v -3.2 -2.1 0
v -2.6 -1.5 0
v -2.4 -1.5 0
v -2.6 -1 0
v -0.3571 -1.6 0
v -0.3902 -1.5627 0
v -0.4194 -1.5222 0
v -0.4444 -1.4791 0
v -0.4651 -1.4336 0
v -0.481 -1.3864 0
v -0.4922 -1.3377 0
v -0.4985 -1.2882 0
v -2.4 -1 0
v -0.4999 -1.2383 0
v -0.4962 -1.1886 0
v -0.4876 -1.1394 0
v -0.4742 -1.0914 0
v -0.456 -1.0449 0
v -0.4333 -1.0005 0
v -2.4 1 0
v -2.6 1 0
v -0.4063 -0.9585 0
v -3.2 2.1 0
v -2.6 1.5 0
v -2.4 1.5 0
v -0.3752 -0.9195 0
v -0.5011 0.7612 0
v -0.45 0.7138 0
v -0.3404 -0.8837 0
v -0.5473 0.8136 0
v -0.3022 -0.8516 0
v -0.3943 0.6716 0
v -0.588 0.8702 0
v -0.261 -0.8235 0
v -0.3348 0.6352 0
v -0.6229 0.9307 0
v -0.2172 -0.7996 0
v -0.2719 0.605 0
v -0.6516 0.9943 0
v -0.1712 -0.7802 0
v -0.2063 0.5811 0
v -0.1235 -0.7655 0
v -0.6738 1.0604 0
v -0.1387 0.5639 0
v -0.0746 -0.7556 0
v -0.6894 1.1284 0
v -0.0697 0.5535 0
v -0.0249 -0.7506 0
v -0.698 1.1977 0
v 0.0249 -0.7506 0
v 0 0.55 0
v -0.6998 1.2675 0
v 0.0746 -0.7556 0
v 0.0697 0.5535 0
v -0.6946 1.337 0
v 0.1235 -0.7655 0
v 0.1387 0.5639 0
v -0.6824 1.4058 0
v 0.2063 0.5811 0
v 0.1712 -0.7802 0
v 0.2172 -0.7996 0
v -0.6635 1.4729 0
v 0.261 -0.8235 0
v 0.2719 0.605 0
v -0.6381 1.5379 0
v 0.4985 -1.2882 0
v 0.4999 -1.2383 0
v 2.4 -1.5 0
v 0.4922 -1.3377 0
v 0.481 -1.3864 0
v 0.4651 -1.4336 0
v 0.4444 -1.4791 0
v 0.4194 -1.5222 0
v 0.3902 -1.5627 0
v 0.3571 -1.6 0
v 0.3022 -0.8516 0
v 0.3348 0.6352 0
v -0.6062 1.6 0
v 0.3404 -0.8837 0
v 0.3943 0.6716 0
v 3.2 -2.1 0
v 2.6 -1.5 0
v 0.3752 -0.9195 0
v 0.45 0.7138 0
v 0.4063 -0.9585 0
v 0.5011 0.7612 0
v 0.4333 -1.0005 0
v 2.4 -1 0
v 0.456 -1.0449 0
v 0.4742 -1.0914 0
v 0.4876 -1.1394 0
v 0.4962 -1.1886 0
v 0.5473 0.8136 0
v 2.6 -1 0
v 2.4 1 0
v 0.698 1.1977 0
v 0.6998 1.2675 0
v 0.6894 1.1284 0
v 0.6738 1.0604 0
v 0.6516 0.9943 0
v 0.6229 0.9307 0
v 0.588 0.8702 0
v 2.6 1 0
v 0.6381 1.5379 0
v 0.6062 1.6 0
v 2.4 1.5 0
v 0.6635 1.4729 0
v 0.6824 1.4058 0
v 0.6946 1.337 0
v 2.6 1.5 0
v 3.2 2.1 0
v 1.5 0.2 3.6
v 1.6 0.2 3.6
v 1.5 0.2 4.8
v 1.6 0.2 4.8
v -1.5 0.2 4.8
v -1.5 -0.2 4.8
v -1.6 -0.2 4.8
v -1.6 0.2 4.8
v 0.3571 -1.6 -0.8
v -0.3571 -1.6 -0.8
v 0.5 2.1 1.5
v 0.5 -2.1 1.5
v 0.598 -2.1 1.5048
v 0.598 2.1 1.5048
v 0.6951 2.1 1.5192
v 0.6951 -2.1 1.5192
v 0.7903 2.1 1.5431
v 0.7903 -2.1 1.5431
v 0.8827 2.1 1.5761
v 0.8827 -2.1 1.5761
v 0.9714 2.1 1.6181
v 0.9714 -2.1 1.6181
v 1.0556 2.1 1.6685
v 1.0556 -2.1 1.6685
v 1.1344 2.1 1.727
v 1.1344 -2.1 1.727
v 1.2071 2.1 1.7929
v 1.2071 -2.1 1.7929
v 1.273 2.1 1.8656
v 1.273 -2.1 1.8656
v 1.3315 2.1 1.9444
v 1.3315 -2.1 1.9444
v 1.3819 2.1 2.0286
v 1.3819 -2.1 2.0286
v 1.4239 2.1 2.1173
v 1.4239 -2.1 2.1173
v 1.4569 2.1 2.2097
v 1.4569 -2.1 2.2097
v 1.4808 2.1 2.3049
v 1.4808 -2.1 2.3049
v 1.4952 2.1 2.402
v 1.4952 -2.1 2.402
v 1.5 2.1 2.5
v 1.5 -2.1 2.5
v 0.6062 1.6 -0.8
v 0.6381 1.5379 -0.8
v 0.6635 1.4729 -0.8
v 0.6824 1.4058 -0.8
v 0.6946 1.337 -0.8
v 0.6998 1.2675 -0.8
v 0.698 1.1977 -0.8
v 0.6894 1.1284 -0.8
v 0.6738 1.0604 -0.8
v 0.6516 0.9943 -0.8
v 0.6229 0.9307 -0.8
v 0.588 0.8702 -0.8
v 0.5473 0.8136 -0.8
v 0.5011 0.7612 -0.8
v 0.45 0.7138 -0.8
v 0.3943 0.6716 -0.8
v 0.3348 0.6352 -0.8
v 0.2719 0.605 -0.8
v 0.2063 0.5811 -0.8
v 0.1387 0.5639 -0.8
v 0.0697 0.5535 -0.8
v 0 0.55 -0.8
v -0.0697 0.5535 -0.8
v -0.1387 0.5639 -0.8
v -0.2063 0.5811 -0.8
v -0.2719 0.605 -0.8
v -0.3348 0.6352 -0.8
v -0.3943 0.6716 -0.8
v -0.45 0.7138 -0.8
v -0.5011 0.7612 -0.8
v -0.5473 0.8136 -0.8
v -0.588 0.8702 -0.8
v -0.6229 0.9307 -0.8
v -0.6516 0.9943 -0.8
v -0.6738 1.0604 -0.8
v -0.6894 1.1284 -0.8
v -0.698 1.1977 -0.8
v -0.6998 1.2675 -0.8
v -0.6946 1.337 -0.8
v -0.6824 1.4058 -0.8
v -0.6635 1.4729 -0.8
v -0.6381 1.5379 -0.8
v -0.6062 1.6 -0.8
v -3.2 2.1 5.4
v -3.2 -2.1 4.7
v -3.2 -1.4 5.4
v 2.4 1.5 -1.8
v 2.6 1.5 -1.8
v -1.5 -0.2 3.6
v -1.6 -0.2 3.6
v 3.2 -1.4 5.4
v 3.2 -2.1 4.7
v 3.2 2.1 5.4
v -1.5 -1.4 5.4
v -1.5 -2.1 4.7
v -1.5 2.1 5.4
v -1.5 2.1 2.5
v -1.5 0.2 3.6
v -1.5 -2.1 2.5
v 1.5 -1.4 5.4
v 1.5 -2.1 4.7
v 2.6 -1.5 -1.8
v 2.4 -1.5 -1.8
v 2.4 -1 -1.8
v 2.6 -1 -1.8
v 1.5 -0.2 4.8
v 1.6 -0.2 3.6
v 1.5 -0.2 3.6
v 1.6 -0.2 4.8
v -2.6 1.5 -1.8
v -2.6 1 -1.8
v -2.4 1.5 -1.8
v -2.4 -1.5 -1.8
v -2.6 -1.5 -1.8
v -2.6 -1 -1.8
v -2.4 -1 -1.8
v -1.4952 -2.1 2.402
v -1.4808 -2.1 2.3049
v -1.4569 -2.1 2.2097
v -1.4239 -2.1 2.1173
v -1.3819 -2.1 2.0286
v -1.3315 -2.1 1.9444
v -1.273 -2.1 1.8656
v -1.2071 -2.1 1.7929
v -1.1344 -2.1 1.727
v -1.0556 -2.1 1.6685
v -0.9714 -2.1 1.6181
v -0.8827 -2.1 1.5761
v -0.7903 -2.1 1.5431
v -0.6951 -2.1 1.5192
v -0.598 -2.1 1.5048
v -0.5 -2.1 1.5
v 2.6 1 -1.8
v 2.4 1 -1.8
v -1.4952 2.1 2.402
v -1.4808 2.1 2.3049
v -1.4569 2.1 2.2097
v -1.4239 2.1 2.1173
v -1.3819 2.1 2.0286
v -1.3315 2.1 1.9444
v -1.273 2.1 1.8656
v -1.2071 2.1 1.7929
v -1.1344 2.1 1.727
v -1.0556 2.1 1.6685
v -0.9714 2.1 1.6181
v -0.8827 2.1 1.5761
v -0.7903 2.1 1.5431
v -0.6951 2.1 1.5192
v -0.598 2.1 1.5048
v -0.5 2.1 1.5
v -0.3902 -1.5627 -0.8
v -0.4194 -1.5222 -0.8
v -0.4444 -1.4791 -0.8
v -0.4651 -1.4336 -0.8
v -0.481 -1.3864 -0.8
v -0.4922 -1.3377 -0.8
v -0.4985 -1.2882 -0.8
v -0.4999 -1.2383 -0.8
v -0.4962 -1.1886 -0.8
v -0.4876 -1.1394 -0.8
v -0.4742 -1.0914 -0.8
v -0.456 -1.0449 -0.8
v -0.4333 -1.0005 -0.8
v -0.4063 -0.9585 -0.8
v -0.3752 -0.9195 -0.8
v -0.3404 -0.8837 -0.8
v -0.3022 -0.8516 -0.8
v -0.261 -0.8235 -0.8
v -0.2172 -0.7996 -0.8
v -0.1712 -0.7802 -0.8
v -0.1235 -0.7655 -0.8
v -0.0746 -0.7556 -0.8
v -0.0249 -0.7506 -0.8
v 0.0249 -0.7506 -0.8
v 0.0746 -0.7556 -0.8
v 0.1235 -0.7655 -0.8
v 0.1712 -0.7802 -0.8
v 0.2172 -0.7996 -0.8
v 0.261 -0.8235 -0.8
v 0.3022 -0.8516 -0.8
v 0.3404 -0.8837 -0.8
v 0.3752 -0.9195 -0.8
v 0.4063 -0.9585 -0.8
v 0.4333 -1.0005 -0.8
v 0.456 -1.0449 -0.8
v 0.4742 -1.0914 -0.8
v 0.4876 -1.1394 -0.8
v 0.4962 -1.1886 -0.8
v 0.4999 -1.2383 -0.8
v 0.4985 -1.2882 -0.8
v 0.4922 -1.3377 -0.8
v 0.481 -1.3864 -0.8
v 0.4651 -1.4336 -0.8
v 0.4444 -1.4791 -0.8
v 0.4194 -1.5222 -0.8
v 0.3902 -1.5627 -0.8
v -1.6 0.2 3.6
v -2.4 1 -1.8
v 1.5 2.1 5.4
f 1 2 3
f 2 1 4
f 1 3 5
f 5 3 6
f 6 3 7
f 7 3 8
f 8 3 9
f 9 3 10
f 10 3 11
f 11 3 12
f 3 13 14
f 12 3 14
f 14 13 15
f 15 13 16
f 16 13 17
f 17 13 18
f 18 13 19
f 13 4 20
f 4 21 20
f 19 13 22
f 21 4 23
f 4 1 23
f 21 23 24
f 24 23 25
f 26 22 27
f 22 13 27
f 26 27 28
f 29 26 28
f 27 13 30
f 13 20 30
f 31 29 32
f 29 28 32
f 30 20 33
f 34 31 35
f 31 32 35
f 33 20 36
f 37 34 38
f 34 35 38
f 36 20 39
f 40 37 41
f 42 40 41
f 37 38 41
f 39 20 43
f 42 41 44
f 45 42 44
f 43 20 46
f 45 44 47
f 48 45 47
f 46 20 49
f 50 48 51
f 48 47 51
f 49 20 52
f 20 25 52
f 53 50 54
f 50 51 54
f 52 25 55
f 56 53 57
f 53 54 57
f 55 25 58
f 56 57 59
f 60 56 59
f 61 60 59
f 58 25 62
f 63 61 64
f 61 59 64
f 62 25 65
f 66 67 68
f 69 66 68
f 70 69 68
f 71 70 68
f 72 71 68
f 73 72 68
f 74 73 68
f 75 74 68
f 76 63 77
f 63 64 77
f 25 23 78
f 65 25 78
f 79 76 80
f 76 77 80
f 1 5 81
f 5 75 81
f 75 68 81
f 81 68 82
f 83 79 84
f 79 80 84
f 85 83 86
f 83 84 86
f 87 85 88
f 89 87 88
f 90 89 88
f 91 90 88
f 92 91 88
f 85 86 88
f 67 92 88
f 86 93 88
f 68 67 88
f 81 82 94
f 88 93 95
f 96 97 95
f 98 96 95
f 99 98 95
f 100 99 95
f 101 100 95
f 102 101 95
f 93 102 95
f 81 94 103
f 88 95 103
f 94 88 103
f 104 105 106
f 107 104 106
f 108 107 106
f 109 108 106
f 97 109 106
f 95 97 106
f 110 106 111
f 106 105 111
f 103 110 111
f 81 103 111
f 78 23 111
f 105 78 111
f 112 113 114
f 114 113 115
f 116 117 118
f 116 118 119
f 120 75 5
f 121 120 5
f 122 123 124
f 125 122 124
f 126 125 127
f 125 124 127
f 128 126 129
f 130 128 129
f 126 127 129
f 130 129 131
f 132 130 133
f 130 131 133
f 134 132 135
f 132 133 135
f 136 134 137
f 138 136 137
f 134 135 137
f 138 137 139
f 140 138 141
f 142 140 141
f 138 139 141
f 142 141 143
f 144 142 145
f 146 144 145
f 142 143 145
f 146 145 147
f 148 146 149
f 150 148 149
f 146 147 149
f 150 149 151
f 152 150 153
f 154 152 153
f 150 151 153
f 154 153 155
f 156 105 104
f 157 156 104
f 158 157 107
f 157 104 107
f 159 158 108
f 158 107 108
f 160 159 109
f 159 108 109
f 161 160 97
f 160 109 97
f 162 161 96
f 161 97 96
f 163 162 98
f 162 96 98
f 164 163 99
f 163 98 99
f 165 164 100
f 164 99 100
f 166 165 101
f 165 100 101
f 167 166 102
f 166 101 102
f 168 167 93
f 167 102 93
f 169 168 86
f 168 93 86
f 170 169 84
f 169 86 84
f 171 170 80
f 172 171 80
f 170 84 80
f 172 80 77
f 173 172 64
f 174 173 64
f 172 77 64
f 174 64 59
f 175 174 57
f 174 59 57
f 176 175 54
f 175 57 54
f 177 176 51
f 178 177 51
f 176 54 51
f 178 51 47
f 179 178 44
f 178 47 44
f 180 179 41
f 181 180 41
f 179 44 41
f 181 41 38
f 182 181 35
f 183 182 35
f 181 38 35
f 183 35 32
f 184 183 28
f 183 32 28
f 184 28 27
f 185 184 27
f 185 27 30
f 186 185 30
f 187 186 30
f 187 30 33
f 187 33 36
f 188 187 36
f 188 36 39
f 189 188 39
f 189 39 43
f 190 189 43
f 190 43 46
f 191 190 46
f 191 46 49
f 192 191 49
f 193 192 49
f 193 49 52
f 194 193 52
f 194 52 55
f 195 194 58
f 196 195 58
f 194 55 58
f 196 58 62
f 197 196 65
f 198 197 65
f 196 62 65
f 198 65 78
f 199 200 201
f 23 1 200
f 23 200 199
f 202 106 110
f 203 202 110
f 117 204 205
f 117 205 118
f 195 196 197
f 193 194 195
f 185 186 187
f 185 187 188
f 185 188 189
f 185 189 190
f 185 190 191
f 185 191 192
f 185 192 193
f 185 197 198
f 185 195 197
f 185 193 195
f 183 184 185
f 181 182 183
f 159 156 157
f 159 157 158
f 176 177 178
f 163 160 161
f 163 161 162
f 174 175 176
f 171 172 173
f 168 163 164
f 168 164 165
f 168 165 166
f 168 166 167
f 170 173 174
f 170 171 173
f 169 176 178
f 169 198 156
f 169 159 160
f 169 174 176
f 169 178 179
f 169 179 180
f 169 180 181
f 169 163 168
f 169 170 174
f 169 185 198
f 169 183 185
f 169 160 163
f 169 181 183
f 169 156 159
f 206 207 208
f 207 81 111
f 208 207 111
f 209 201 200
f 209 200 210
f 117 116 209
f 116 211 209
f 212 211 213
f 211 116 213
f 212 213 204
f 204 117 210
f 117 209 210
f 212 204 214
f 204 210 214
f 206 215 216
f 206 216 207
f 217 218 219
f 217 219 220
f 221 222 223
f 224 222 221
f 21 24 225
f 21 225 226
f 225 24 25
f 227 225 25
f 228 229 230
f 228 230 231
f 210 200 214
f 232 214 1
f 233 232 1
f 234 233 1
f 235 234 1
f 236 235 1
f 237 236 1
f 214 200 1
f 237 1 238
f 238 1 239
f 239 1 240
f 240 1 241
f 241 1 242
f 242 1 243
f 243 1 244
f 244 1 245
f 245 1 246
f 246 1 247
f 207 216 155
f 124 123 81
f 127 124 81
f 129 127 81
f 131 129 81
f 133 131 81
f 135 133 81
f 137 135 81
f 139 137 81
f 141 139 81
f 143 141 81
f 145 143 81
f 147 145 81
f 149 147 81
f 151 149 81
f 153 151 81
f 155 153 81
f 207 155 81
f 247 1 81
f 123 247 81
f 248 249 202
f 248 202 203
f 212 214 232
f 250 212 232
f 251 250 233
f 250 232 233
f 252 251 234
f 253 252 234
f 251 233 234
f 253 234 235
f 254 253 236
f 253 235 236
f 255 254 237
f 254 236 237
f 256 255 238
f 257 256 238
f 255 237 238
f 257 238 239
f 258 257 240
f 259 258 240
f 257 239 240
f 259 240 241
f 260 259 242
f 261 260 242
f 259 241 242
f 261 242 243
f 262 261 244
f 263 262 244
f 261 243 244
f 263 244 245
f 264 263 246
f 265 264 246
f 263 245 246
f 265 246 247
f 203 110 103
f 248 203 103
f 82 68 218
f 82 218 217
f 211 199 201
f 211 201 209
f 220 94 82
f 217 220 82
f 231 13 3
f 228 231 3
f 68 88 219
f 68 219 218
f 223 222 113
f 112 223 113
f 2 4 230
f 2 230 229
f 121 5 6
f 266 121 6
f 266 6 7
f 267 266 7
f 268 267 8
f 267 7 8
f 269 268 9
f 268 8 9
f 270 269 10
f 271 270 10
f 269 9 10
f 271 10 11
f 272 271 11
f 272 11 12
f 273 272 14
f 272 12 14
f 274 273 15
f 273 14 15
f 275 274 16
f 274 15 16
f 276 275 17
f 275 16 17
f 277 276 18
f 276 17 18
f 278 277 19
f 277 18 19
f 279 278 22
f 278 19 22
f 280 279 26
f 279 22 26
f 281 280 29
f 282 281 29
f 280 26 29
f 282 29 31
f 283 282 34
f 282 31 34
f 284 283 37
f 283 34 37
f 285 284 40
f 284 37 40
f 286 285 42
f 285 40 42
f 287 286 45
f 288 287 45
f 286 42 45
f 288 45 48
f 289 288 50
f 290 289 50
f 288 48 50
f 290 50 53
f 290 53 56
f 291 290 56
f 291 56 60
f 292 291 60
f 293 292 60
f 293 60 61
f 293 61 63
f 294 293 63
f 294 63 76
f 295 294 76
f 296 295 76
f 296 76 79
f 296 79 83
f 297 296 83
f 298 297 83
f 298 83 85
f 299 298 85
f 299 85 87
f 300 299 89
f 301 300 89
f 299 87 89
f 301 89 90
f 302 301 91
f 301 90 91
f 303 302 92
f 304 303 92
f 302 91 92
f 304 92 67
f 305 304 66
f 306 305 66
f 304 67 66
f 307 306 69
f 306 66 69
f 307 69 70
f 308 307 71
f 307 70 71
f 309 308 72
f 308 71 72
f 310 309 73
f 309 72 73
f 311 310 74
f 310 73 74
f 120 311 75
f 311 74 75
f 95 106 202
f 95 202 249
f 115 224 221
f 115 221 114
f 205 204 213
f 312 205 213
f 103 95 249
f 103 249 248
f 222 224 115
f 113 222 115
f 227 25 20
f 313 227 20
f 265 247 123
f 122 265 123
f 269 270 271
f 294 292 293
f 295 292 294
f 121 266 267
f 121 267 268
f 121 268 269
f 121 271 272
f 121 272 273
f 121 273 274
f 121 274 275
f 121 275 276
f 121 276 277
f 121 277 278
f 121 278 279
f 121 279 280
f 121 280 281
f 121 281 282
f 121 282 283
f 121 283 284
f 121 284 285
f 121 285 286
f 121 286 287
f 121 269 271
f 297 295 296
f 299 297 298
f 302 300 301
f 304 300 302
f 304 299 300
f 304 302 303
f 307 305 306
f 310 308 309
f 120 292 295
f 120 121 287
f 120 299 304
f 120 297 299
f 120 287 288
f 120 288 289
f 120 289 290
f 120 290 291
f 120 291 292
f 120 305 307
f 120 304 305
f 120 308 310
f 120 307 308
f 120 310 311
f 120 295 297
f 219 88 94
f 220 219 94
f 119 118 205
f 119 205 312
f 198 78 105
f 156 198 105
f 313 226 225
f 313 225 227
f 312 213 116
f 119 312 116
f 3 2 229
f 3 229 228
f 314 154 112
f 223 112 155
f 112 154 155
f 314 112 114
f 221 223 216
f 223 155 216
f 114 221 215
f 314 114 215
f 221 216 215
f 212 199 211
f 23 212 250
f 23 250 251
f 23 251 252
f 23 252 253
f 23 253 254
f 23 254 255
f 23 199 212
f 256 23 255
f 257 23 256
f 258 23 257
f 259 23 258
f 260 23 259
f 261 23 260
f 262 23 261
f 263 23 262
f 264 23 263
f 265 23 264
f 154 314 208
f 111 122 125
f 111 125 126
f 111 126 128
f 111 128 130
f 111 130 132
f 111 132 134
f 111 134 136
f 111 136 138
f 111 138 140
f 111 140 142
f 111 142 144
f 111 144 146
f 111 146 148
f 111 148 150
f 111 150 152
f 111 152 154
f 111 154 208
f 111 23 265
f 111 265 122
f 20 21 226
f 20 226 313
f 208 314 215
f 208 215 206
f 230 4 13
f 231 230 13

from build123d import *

# Parameters (mm, degrees)
F0_W      = 6.4
F0_H      = 4.2
F1_DEPTH  = 5.4
F3_DEPTH  = 4.2
F4_SIZE   = 0.7
F5_W      = 0.4
F5_H      = 1.2
F6_DEPTH  = 1.6
F8_DEPTH  = 0.8
F9_W      = 0.2
F9_H      = 0.5
F10_DEPTH = 1.8


with BuildPart() as f1:
    # F0 (on Top) → F1 (new body)
    with BuildSketch(Plane.XY):
        Rectangle(F0_W, F0_H)
    extrude(amount=F1_DEPTH)

    # F2 (on face) → F3 (cut, through all)
    with BuildSketch(Plane.XZ.offset(2.1)):
        with BuildLine():
            Line((1.5, 2.5), (1.5, 5.4))
            Line((1.5, 5.4), (-1.5, 5.4))
            Line((-1.5, 5.4), (-1.5, 2.5))
            ThreePointArc((-1.5, 2.5), (-1.207107, 1.792893), (-0.5, 1.5))
            Line((-0.5, 1.5), (0.5, 1.5))
            ThreePointArc((0.5, 1.5), (1.207107, 1.792893), (1.5, 2.5))
        make_face()
    extrude(amount=-F3_DEPTH, mode=Mode.SUBTRACT)

    # F4
    f4_edges = [f1.edges().sort_by_distance(p)[0] for p in [
        (2.35, -2.1, 5.4),
        (-2.35, -2.1, 5.4),
    ]]
    chamfer(f4_edges, length=F4_SIZE)

    # F5 (on Right) → F6 (cut, symmetric)
    with BuildSketch(Plane.YZ):
        with Locations((0, 4.2)):
            Rectangle(F5_W, F5_H)
    extrude(amount=F6_DEPTH, both=True, mode=Mode.SUBTRACT)

    # F7 (on face) → F8 (join)
    with BuildSketch(Plane(origin=(0, 0, 0), x_dir=(1, 0, 0), z_dir=(0, 0, -1))):
        with BuildLine():
            Line((0.357071, 1.6), (-0.357071, 1.6))
            ThreePointArc((-0.357071, 1.6), (0, 0.75), (0.357071, 1.6))
        make_face()
        with BuildLine():
            Line((-0.606218, -1.6), (0.606218, -1.6))
            ThreePointArc((0.606218, -1.6), (0, -0.55), (-0.606218, -1.6))
        make_face()
    extrude(amount=F8_DEPTH)

    # F9 (on face) → F10 (join)
    with BuildSketch(Plane(origin=(0, 0, 0), x_dir=(1, 0, 0), z_dir=(0, 0, -1))):
        with Locations((-2.5, 1.25)):
            Rectangle(F9_W, F9_H)
        with Locations((-2.5, -1.25)):
            Rectangle(F9_W, F9_H)
        with Locations((2.5, 1.25)):
            Rectangle(F9_W, F9_H)
        with Locations((2.5, -1.25)):
            Rectangle(F9_W, F9_H)
    extrude(amount=F10_DEPTH)


solid = f1.part
